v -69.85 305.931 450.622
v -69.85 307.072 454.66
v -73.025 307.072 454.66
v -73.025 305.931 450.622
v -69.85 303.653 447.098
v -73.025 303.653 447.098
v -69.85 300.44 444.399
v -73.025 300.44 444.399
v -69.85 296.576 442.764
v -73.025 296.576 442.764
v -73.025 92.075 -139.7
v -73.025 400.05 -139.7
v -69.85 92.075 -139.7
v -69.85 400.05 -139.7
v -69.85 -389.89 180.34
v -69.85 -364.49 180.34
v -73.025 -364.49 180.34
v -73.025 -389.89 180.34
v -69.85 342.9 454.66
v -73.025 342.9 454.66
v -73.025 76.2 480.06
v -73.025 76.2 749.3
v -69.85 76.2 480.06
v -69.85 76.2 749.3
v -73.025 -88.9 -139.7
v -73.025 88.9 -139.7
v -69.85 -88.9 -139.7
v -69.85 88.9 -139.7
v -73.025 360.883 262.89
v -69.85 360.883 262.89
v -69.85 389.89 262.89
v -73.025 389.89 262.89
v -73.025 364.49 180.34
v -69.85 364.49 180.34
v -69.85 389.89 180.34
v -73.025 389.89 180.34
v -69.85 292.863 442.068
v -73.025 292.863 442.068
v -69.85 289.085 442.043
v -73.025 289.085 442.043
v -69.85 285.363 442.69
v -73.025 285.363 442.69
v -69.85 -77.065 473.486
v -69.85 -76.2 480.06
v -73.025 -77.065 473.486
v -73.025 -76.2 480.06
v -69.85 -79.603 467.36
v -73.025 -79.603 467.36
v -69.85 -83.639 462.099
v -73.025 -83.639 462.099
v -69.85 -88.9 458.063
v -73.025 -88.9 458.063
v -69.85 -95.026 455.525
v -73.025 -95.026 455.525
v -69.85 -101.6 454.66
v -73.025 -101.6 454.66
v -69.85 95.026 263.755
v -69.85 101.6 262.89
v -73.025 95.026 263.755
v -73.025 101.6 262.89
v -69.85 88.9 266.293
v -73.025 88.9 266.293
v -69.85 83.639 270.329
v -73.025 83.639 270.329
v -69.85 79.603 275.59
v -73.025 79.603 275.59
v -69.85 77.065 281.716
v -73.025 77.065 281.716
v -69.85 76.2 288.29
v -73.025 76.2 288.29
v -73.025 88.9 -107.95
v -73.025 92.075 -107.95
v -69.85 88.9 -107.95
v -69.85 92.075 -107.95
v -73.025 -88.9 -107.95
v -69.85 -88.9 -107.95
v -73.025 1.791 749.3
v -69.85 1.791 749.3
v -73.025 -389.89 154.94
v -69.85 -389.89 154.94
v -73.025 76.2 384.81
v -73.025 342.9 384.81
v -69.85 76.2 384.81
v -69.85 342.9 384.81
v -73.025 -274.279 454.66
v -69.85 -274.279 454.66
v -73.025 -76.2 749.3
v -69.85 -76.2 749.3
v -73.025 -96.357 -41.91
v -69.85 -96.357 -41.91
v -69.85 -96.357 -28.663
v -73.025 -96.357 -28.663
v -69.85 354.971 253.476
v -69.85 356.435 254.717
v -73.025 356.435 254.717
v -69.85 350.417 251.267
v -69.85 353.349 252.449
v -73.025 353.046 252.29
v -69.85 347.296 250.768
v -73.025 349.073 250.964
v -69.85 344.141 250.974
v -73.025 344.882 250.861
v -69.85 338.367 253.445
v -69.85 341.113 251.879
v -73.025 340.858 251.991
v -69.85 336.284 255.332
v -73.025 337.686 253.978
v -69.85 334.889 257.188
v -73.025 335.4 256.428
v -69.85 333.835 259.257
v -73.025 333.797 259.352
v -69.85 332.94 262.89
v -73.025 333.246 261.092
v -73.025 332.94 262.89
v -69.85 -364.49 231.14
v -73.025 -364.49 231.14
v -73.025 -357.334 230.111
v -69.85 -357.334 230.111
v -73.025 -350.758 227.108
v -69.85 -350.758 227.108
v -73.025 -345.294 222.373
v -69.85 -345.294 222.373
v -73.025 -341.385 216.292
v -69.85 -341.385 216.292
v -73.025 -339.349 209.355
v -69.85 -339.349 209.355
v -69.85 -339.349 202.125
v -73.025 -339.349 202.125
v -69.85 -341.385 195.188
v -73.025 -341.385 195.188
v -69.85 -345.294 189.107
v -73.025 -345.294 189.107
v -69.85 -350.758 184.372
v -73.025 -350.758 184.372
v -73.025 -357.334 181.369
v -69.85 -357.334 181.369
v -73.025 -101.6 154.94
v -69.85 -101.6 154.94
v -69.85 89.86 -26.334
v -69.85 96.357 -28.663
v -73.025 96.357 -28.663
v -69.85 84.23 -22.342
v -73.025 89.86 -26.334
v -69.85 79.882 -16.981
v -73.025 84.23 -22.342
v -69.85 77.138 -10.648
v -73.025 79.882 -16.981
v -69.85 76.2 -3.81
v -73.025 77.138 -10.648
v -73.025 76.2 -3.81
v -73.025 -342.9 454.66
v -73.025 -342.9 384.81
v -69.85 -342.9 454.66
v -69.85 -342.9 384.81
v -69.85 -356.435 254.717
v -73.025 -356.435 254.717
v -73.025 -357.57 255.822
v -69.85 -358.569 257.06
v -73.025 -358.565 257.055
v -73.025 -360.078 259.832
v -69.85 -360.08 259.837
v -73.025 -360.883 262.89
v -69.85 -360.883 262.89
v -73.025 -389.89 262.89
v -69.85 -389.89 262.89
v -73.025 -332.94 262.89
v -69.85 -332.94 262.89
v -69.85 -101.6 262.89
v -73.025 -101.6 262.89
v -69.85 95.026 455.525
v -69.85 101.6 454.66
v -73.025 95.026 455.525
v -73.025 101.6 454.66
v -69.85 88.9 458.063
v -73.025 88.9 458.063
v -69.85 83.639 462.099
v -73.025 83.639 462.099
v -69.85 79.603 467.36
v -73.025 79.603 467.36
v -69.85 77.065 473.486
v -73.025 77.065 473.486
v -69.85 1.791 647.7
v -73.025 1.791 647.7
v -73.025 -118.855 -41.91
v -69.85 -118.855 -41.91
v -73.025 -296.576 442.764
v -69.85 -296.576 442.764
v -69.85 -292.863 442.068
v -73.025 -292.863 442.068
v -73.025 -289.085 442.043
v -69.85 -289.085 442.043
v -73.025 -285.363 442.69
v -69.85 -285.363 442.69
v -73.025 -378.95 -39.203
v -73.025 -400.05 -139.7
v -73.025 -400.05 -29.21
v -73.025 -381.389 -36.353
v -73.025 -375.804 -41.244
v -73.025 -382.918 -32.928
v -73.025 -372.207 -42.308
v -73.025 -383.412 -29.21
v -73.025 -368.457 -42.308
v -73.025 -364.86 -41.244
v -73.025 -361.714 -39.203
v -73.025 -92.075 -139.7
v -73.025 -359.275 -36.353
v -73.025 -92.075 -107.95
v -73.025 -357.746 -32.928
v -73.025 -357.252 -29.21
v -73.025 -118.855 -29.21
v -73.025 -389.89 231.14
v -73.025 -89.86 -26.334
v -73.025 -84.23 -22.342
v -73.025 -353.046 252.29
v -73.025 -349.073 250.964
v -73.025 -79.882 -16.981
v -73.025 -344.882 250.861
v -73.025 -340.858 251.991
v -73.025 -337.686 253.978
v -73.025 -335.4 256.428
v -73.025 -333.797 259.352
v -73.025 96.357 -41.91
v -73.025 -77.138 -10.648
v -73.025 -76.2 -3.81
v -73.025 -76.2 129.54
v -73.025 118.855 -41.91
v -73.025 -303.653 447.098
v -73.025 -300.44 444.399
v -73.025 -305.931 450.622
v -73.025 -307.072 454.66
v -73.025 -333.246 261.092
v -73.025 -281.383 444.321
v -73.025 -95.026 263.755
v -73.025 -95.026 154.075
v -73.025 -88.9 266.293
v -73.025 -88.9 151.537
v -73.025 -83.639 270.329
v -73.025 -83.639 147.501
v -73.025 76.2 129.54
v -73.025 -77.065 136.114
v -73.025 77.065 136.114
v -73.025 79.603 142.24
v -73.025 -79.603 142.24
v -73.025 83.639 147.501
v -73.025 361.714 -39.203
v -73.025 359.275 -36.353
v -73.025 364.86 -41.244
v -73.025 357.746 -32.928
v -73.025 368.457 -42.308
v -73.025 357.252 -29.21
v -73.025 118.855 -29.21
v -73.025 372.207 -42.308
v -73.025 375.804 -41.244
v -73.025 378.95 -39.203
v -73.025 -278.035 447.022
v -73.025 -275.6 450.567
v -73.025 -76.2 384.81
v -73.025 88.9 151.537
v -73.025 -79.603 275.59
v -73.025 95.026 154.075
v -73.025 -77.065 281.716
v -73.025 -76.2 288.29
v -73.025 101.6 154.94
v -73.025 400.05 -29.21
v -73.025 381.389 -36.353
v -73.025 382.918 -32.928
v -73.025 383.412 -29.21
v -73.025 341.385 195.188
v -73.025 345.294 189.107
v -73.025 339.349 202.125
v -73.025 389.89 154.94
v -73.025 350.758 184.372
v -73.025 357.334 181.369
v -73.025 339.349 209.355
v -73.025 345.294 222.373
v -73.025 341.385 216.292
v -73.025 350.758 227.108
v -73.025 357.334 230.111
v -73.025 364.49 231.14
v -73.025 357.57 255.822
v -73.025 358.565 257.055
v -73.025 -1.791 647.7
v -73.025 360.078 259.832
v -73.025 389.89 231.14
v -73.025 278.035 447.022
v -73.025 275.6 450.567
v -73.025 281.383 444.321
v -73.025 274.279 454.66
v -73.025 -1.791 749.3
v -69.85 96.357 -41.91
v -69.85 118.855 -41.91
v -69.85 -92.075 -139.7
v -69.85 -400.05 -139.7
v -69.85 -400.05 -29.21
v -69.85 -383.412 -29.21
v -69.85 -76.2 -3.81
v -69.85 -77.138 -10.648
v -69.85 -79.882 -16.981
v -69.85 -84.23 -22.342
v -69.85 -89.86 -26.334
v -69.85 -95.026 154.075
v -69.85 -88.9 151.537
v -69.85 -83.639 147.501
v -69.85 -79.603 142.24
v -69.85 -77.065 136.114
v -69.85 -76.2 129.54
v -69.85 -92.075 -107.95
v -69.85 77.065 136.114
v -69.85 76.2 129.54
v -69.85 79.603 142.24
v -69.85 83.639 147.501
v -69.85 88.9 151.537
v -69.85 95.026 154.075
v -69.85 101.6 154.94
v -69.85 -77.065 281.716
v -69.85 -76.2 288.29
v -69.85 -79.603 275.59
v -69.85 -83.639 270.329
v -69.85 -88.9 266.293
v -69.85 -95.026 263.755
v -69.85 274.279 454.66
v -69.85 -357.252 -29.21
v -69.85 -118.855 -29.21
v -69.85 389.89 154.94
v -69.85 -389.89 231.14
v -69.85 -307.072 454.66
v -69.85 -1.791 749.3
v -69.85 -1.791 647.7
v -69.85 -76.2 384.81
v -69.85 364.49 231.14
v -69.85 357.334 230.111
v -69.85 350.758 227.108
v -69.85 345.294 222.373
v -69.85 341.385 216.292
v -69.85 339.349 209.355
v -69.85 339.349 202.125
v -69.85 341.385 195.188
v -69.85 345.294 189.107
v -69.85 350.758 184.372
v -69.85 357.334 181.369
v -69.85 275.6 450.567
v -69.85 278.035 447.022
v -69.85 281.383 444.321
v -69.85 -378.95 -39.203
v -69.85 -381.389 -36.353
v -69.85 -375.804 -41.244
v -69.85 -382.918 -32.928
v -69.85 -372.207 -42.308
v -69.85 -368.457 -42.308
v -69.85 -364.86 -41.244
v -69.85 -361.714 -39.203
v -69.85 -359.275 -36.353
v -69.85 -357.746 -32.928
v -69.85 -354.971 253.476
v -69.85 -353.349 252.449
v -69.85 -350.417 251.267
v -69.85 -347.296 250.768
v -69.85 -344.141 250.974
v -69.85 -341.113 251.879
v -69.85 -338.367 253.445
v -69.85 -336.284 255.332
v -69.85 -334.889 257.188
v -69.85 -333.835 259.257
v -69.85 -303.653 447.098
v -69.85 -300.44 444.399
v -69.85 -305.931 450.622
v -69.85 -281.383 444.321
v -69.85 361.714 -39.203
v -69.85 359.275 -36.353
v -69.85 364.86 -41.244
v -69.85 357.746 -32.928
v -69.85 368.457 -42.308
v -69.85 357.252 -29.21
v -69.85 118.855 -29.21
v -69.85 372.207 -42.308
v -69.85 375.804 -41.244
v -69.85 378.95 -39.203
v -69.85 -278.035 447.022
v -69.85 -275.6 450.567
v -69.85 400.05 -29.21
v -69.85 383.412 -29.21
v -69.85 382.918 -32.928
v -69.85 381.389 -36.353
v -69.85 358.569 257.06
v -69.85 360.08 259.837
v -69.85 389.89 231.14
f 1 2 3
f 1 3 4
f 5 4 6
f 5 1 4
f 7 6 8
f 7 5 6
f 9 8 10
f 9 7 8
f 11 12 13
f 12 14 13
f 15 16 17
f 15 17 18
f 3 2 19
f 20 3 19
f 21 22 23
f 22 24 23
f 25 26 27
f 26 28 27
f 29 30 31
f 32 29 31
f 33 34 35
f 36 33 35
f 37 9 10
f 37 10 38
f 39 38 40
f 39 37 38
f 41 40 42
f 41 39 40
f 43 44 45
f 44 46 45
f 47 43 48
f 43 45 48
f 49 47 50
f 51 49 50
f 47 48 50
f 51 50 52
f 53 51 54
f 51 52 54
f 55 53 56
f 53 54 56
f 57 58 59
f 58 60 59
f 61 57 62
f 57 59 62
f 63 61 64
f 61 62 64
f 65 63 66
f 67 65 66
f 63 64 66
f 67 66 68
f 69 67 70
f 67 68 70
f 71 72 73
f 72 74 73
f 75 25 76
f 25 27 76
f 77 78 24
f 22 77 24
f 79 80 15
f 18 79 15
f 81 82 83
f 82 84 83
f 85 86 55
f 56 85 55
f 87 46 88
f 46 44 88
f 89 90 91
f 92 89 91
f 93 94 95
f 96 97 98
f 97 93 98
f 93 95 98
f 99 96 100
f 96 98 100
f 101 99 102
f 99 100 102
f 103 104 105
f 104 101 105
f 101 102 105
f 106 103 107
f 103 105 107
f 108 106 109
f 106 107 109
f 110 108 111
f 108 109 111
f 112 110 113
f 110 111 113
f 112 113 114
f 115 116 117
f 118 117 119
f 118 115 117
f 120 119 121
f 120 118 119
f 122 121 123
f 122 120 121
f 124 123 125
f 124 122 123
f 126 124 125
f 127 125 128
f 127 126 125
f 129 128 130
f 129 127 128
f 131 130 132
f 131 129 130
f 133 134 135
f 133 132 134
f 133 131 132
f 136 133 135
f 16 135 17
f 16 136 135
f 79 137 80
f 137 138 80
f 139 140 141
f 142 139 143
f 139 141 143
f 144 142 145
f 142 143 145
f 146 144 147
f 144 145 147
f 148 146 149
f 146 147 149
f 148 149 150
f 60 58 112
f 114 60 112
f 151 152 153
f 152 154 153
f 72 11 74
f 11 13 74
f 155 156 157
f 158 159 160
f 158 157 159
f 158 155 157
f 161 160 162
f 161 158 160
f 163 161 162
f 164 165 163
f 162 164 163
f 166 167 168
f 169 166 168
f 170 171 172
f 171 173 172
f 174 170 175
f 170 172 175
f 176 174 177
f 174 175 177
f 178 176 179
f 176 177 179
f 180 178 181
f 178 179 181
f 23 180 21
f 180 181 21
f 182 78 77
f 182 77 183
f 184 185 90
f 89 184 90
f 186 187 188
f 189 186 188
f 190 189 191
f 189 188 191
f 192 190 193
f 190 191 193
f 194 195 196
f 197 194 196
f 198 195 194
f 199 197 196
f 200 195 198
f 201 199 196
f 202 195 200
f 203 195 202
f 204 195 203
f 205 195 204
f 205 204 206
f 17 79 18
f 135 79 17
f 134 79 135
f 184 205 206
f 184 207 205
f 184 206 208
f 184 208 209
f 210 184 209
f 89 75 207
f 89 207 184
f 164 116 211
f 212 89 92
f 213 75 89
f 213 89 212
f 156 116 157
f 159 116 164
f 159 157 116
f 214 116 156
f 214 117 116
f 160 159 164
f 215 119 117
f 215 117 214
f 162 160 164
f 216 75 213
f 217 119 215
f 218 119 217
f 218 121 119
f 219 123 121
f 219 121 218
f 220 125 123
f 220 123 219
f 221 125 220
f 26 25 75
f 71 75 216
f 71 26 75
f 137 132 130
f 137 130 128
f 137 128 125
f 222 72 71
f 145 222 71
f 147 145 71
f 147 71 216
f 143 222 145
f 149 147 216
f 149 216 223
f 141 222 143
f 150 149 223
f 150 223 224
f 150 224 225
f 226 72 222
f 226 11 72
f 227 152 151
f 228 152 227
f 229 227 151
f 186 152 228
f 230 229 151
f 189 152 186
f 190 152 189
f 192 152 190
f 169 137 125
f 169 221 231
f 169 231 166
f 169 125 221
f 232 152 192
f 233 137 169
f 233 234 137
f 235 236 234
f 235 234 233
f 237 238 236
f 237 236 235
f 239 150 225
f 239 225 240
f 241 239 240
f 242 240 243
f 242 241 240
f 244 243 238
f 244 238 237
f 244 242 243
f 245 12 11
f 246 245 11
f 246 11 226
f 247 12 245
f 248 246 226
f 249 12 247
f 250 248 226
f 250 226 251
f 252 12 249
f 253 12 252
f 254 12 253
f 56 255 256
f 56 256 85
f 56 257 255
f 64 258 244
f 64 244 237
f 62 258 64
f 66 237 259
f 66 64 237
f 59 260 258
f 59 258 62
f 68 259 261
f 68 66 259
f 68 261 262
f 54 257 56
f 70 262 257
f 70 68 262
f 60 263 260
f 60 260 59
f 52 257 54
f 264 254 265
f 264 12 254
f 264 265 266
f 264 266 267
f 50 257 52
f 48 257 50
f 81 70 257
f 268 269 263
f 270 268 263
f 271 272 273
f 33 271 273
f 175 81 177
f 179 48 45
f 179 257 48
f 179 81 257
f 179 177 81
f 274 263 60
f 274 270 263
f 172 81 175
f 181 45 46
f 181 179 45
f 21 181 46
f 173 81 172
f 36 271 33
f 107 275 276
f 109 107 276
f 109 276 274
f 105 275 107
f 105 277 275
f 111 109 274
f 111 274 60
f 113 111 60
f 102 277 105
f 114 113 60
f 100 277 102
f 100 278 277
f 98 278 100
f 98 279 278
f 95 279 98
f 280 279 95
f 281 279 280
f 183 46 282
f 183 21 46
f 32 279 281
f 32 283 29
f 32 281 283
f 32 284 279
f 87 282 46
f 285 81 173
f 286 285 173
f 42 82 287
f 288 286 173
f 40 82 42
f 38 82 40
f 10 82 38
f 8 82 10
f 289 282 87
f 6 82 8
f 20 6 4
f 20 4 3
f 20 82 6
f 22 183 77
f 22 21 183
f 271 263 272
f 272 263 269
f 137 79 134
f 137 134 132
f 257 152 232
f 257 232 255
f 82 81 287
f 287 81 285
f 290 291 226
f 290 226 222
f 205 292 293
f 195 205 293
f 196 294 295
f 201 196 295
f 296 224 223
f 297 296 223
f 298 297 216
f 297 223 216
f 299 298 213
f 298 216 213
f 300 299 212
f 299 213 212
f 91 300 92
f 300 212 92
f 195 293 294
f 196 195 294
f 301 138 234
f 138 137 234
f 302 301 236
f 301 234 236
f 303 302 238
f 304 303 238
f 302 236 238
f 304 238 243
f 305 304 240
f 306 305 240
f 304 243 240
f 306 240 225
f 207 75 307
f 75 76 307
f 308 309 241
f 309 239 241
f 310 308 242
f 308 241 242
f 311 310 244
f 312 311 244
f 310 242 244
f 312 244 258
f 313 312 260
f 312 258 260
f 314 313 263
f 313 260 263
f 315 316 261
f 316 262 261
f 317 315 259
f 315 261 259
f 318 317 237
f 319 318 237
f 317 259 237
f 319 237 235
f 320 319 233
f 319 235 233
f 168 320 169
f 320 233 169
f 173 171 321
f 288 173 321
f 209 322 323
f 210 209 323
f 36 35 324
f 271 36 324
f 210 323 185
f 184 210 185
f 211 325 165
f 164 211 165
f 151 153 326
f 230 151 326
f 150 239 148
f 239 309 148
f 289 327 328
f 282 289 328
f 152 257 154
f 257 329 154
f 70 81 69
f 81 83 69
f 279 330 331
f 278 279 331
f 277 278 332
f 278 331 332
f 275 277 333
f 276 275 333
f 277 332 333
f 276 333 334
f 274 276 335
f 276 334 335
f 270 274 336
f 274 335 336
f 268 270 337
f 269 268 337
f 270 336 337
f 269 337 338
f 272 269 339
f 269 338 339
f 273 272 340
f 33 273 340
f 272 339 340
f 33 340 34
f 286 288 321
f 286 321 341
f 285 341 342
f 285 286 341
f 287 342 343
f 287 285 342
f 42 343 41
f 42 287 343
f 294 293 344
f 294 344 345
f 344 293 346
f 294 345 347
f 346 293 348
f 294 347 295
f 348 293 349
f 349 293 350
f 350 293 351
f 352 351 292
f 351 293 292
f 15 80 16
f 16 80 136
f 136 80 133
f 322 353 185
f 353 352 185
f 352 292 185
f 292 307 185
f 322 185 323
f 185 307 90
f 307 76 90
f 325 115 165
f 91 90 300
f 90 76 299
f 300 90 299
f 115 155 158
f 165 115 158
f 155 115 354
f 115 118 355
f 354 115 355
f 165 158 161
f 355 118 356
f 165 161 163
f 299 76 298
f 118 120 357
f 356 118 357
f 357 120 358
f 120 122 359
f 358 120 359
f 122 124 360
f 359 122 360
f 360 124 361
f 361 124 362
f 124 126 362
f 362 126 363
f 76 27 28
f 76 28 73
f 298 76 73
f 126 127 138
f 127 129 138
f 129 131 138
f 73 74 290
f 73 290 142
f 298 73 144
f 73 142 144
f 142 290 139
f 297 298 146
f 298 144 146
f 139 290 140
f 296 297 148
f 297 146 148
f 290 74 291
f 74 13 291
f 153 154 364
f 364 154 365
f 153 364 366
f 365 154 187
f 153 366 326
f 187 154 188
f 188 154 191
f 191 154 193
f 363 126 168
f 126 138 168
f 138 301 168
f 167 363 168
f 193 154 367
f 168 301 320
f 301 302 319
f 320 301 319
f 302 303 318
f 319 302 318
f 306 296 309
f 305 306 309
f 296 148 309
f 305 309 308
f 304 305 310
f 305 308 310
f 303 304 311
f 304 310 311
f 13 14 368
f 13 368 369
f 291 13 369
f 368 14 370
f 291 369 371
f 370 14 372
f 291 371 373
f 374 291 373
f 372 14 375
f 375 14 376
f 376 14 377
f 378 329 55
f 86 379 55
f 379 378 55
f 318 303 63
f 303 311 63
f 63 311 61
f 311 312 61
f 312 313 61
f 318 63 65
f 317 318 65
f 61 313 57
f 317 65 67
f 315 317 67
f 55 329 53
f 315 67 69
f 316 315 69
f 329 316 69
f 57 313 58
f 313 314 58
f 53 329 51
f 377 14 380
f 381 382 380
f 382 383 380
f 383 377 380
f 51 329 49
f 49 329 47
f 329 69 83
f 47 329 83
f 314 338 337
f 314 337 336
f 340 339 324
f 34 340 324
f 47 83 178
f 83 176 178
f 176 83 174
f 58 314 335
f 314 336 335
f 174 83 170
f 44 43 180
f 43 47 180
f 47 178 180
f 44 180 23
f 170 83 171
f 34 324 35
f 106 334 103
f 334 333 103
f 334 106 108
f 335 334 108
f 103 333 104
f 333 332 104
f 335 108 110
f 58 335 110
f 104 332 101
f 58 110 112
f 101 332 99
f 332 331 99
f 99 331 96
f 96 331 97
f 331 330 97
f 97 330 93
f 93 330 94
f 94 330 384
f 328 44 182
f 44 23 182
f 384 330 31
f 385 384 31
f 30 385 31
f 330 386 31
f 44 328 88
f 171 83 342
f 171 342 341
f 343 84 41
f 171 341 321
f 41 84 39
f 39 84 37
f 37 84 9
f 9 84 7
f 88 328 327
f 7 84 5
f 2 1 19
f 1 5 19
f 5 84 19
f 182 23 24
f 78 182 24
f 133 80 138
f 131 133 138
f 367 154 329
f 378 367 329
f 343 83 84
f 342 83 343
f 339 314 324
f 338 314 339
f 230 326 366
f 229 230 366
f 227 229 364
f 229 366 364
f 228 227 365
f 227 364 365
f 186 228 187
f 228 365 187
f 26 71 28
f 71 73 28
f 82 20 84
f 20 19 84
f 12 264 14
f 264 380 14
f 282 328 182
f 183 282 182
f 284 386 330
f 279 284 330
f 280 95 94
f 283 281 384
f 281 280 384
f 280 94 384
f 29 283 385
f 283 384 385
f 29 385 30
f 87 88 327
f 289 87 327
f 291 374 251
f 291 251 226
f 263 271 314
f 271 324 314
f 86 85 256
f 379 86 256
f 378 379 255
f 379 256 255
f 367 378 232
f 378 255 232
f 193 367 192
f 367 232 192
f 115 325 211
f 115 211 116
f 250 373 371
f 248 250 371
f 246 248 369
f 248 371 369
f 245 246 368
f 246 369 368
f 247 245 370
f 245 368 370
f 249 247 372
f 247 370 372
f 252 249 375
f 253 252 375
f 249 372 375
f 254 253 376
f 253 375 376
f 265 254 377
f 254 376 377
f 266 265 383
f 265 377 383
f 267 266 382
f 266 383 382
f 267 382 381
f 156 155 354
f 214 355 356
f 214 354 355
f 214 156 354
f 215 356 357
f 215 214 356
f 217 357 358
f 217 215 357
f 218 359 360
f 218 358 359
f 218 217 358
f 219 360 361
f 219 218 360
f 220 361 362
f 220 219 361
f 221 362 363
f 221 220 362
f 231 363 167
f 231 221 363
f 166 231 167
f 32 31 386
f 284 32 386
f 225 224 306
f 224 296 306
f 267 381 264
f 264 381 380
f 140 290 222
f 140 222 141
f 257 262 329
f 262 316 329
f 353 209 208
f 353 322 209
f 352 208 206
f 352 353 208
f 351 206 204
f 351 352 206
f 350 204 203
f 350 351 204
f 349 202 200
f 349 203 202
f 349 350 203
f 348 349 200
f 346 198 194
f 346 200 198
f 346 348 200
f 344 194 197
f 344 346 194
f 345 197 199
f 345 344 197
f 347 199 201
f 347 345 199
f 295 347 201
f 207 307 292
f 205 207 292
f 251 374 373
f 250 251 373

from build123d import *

# Parameters (mm, degrees)
BOSS_EXTRUDE1_DEPTH = 1.5875
SKETCH2_R           = 13.081
CUT_EXTRUDE1_DEPTH  = 282.7782
CUT_EXTRUDE2_REACH  = 907.396
SKETCH3_R           = 13.081
SKETCH5_RX          = 13.458967046
SKETCH5_RY          = 13.27706685
CUT_EXTRUDE3_DEPTH  = 850.411898389
SKETCH7_RX          = 13.827169688
SKETCH7_RY          = 13.509347203
CUT_EXTRUDE4_DEPTH  = 850.411898525
SURFACECUT1_ANGLE   = 12.730551
CUT_EXTRUDE13_DEPTH = 850.411898527
CUT_EXTRUDE14_START = -3.175
CUT_EXTRUDE14_DEPTH = 3.175
CUT_EXTRUDE15_DEPTH = 850.411898527
CUT_EXTRUDE16_DEPTH = 850.411898527
FILLET1_R           = 25.4
SKETCH28_W          = 101.6
SKETCH28_H          = 1.7907
CUT_EXTRUDE17_DEPTH = 850.411898527
CUT_EXTRUDE18_DEPTH = 850.411898527
CUT_EXTRUDE19_DEPTH = 850.411898527


# Read off the part's stored shape, not the designer's step: SurfaceCut1, Cut-Extrude14
with BuildPart() as part:
    # Sketch1 → Boss-Extrude1 (new, symmetric)
    with BuildSketch(Plane(origin=(-71.4375, 0, 0), x_dir=(0, 0, -1), z_dir=(1, 0, 0))):
        Polygon((139.7, -400.05), (29.21, -400.05), (29.21, -76.2), (-154.94, -76.2), (-154.94, -389.89), (-262.89, -389.89), (-262.89, -76.2), (-384.81, -76.2), (-384.81, -342.9), (-454.66, -342.9), (-454.66, -76.2), (-749.3, -76.2), (-749.3, 76.2), (-454.66, 76.2), (-454.66, 342.9), (-384.81, 342.9), (-384.81, 76.2), (-262.89, 76.2), (-262.89, 389.89), (-154.94, 389.89), (-154.94, 76.2), (29.21, 76.2), (29.21, 400.05), (139.7, 400.05), (139.7, 92.075), (107.95, 92.075), (107.95, 88.9), (139.7, 88.9), (139.7, -88.9), (107.95, -88.9), (107.95, -92.075), (139.7, -92.075), align=None)
    extrude(amount=BOSS_EXTRUDE1_DEPTH, both=True)

    # Sketch2 → Cut-Extrude1 (cut)
    with BuildSketch(Plane(origin=(209.7532, 370.332, -29.3624), x_dir=(0, 0, -1), z_dir=(1, 0, 0))):
        Circle(SKETCH2_R)
    cut_extrude1 = extrude(amount=-CUT_EXTRUDE1_DEPTH, mode=Mode.SUBTRACT)

    # Cut-Extrude2: up to this plane
    cut_extrude2_end = Plane(origin=(-73.025, 0, 0), z_dir=(-1, 0, 0))
    # Sketch3 → Cut-Extrude2 (cut, up to the surface)
    with BuildSketch(Plane(origin=(4.654591859, 367.519252147, 275.4376), x_dir=(0.13291538281760473, 0.03562595760229639, -0.9904868965086662), z_dir=(0.9567163781525703, 0.25643335182849597, 0.13760707774177544)), mode=Mode.PRIVATE) as cut_extrude2_sk1:
        Circle(SKETCH3_R)
    cut_extrude2_tool1 = split(extrude(cut_extrude2_sk1.sketch, amount=-CUT_EXTRUDE2_REACH, mode=Mode.PRIVATE), bisect_by=cut_extrude2_end, keep=Keep.BOTH, mode=Mode.PRIVATE)
    cut_extrude2 = cut_extrude2_tool1.solids().sort_by_distance((4.654592, 367.519252, 275.4376))[0]
    add(cut_extrude2, mode=Mode.SUBTRACT)

    # Sketch5 → Cut-Extrude3 (cut, through all)
    with BuildSketch(Plane(origin=(-69.85, 0, 0), x_dir=(0, 0, -1), z_dir=(1, 0, 0))):
        with Locations(Location((-264.721405109, 347.549423415), (0, 0, 82.179315893))):
            Ellipse(SKETCH5_RX, SKETCH5_RY)
    cut_extrude3 = extrude(amount=-CUT_EXTRUDE3_DEPTH, mode=Mode.SUBTRACT)

    # Sketch7 → Cut-Extrude4 (cut, through all)
    with BuildSketch(Plane.ZY.offset(73.025)):
        with Locations(Location((264.264736359, 346.698412696), (0, 0, -95.705935517))):
            Ellipse(SKETCH7_RX, SKETCH7_RY)
    cut_extrude4 = extrude(amount=-CUT_EXTRUDE4_DEPTH, mode=Mode.SUBTRACT)

    # SurfaceCut1 outline → SurfaceCut1 (revolve, cut)
    with BuildSketch(Plane(origin=(-25.4, 215.408274925, 0), x_dir=(-0.43753517000423214, 0.899201298380606, 0), z_dir=(0.899201298380606, 0.43753517000423214, 0))):
        with BuildLine():
            ThreePointArc((76.208166822, 454.660000025), (88.899999997, 442.415379638), (101.591833177, 454.660000021))
            Line((101.591833177, 454.660000021), (76.208166822, 454.660000025))
        make_face()
    surfacecut1 = revolve(axis=Axis((-25.4, 215.408274925, 0), (0, 0, 1)), revolution_arc=SURFACECUT1_ANGLE, mode=Mode.SUBTRACT)

    # Sketch21 → Cut-Extrude13 (cut, through all)
    with BuildSketch(Plane.ZY.offset(73.025)):
        with BuildLine():
            Line((454.66, 303.637577447), (454.66, 274.279071706))
            ThreePointArc((454.66, 274.279071706), (442.249689548, 288.958324577), (454.66, 303.637577447))
        make_face()
    cut_extrude13 = extrude(amount=-CUT_EXTRUDE13_DEPTH, mode=Mode.SUBTRACT)

    # Cut-Extrude14 outline → Cut-Extrude14 (cut)
    with BuildSketch(Plane(origin=(-69.85, 0, 0), x_dir=(0, 0, -1), z_dir=(1, 0, 0)).offset(CUT_EXTRUDE14_START)):
        with BuildLine():
            Line((-454.66, 291.370782877), (-442.446465515, 291.370782877))
            add(Edge.make_bspline(
                [(-442.446465515, 291.370782877), (-442.305604528, 293.829318521), (-442.944960374, 298.079765742), (-445.927339463, 302.763682225), (-449.764908378, 305.786294337), (-452.799544613, 306.691151874), (-454.66, 306.759783223)],
                knots=[0, 0, 0, 0, 0.33604966, 0.578754716, 0.743869723, 1, 1, 1, 1], degree=3))
            Line((-454.66, 306.759783223), (-454.66, 291.370782877))
        make_face()
    cut_extrude14 = extrude(amount=CUT_EXTRUDE14_DEPTH, mode=Mode.SUBTRACT)

    # Sketch25 → Cut-Extrude15 (cut, through all)
    with BuildSketch(Plane(origin=(-69.85, 0, 0), x_dir=(0, 0, -1), z_dir=(1, 0, 0))):
        with BuildLine():
            Line((-442.434347234, 291.295796674), (-456.435114382, 293.070911057))
            Line((-456.435114382, 293.070911057), (-454.66, 307.071678205))
            ThreePointArc((-454.66, 307.071678205), (-445.279881573, 301.715753032), (-442.434347234, 291.295796674))
        make_face()
    cut_extrude15 = extrude(amount=-CUT_EXTRUDE15_DEPTH, mode=Mode.SUBTRACT)

    # Sketch27 → Cut-Extrude16 (cut, through all)
    with BuildSketch(Plane(origin=(-69.85, 0, 0), x_dir=(0, 0, -1), z_dir=(1, 0, 0))):
        with BuildLine():
            Line((-443.216925762, 283.679849678), (-443.400538268, 298.481302661))
            ThreePointArc((-443.400538268, 298.481302661), (-441.972420297, 291.09715316), (-443.216925762, 283.679849678))
        make_face()
    cut_extrude16 = extrude(amount=-CUT_EXTRUDE16_DEPTH, mode=Mode.SUBTRACT)

    # Mirror1: Cut-Extrude1, Cut-Extrude2, Cut-Extrude3, Cut-Extrude4, SurfaceCut1, Cut-Extrude13, Cut-Extrude14, Cut-Extrude15, Cut-Extrude16 across plane
    add(cut_extrude1.mirror(Plane.ZX), mode=Mode.SUBTRACT)
    add(cut_extrude2.mirror(Plane.ZX), mode=Mode.SUBTRACT)
    add(cut_extrude3.mirror(Plane.ZX), mode=Mode.SUBTRACT)
    add(cut_extrude4.mirror(Plane.ZX), mode=Mode.SUBTRACT)
    add(surfacecut1.mirror(Plane.ZX), mode=Mode.SUBTRACT)
    add(cut_extrude13.mirror(Plane.ZX), mode=Mode.SUBTRACT)
    add(cut_extrude14.mirror(Plane.ZX), mode=Mode.SUBTRACT)
    add(cut_extrude15.mirror(Plane.ZX), mode=Mode.SUBTRACT)
    add(cut_extrude16.mirror(Plane.ZX), mode=Mode.SUBTRACT)

    # Fillet1
    fillet1_edges = [part.edges().sort_by_distance(p)[0] for p in [
        (-71.4375, -76.2, -29.21),
        (-71.4375, -76.2, 154.94),
        (-71.4375, -76.2, 262.89),
        (-71.4375, -76.2, 454.66),
        (-71.4375, 76.2, 454.66),
        (-71.4375, 76.2, 262.89),
        (-71.4375, 76.2, 154.94),
        (-71.4375, 76.2, -29.21),
    ]]
    fillet(fillet1_edges, radius=FILLET1_R)

    # Sketch28 → Cut-Extrude17 (cut, through all)
    with BuildSketch(Plane(origin=(-69.85, 0, 0), x_dir=(0, 0, -1), z_dir=(1, 0, 0))):
        with Locations((-698.5, -0.89535)):
            Rectangle(SKETCH28_W, SKETCH28_H)
        with Locations((-698.5, 0.89535)):
            Rectangle(SKETCH28_W, SKETCH28_H)
    extrude(amount=-CUT_EXTRUDE17_DEPTH, mode=Mode.SUBTRACT)

    # Sketch29 → Cut-Extrude18 (cut, through all)
    with BuildSketch(Plane(origin=(-69.85, 0, 0), x_dir=(0, 0, -1), z_dir=(1, 0, 0))):
        Polygon((29.21, 118.85525736), (41.91, 118.85525736), (41.91, 96.357238024), (28.663036975, 96.357238024), align=None)
        Polygon((29.21, -118.85525736), (41.91, -118.85525736), (41.91, -96.357238024), (28.663036975, -96.357238024), align=None)
    extrude(amount=-CUT_EXTRUDE18_DEPTH, mode=Mode.SUBTRACT)

    # Sketch30 → Cut-Extrude19 (cut, through all)
    with BuildSketch(Plane(origin=(-69.85, 0, 0), x_dir=(0, 0, -1), z_dir=(1, 0, 0))):
        with BuildLine():
            Line((-231.14, 389.89), (-231.14, 364.49))
            ThreePointArc((-231.14, 364.49), (-205.74, 339.09), (-180.34, 364.49))
            Line((-180.34, 364.49), (-180.34, 389.89))
            Line((-180.34, 389.89), (-231.14, 389.89))
        make_face()
    cut_extrude19 = extrude(amount=-CUT_EXTRUDE19_DEPTH, mode=Mode.SUBTRACT)

    # Mirror2: Cut-Extrude19 across plane
    add(cut_extrude19.mirror(Plane.ZX), mode=Mode.SUBTRACT)


solid = part.part
